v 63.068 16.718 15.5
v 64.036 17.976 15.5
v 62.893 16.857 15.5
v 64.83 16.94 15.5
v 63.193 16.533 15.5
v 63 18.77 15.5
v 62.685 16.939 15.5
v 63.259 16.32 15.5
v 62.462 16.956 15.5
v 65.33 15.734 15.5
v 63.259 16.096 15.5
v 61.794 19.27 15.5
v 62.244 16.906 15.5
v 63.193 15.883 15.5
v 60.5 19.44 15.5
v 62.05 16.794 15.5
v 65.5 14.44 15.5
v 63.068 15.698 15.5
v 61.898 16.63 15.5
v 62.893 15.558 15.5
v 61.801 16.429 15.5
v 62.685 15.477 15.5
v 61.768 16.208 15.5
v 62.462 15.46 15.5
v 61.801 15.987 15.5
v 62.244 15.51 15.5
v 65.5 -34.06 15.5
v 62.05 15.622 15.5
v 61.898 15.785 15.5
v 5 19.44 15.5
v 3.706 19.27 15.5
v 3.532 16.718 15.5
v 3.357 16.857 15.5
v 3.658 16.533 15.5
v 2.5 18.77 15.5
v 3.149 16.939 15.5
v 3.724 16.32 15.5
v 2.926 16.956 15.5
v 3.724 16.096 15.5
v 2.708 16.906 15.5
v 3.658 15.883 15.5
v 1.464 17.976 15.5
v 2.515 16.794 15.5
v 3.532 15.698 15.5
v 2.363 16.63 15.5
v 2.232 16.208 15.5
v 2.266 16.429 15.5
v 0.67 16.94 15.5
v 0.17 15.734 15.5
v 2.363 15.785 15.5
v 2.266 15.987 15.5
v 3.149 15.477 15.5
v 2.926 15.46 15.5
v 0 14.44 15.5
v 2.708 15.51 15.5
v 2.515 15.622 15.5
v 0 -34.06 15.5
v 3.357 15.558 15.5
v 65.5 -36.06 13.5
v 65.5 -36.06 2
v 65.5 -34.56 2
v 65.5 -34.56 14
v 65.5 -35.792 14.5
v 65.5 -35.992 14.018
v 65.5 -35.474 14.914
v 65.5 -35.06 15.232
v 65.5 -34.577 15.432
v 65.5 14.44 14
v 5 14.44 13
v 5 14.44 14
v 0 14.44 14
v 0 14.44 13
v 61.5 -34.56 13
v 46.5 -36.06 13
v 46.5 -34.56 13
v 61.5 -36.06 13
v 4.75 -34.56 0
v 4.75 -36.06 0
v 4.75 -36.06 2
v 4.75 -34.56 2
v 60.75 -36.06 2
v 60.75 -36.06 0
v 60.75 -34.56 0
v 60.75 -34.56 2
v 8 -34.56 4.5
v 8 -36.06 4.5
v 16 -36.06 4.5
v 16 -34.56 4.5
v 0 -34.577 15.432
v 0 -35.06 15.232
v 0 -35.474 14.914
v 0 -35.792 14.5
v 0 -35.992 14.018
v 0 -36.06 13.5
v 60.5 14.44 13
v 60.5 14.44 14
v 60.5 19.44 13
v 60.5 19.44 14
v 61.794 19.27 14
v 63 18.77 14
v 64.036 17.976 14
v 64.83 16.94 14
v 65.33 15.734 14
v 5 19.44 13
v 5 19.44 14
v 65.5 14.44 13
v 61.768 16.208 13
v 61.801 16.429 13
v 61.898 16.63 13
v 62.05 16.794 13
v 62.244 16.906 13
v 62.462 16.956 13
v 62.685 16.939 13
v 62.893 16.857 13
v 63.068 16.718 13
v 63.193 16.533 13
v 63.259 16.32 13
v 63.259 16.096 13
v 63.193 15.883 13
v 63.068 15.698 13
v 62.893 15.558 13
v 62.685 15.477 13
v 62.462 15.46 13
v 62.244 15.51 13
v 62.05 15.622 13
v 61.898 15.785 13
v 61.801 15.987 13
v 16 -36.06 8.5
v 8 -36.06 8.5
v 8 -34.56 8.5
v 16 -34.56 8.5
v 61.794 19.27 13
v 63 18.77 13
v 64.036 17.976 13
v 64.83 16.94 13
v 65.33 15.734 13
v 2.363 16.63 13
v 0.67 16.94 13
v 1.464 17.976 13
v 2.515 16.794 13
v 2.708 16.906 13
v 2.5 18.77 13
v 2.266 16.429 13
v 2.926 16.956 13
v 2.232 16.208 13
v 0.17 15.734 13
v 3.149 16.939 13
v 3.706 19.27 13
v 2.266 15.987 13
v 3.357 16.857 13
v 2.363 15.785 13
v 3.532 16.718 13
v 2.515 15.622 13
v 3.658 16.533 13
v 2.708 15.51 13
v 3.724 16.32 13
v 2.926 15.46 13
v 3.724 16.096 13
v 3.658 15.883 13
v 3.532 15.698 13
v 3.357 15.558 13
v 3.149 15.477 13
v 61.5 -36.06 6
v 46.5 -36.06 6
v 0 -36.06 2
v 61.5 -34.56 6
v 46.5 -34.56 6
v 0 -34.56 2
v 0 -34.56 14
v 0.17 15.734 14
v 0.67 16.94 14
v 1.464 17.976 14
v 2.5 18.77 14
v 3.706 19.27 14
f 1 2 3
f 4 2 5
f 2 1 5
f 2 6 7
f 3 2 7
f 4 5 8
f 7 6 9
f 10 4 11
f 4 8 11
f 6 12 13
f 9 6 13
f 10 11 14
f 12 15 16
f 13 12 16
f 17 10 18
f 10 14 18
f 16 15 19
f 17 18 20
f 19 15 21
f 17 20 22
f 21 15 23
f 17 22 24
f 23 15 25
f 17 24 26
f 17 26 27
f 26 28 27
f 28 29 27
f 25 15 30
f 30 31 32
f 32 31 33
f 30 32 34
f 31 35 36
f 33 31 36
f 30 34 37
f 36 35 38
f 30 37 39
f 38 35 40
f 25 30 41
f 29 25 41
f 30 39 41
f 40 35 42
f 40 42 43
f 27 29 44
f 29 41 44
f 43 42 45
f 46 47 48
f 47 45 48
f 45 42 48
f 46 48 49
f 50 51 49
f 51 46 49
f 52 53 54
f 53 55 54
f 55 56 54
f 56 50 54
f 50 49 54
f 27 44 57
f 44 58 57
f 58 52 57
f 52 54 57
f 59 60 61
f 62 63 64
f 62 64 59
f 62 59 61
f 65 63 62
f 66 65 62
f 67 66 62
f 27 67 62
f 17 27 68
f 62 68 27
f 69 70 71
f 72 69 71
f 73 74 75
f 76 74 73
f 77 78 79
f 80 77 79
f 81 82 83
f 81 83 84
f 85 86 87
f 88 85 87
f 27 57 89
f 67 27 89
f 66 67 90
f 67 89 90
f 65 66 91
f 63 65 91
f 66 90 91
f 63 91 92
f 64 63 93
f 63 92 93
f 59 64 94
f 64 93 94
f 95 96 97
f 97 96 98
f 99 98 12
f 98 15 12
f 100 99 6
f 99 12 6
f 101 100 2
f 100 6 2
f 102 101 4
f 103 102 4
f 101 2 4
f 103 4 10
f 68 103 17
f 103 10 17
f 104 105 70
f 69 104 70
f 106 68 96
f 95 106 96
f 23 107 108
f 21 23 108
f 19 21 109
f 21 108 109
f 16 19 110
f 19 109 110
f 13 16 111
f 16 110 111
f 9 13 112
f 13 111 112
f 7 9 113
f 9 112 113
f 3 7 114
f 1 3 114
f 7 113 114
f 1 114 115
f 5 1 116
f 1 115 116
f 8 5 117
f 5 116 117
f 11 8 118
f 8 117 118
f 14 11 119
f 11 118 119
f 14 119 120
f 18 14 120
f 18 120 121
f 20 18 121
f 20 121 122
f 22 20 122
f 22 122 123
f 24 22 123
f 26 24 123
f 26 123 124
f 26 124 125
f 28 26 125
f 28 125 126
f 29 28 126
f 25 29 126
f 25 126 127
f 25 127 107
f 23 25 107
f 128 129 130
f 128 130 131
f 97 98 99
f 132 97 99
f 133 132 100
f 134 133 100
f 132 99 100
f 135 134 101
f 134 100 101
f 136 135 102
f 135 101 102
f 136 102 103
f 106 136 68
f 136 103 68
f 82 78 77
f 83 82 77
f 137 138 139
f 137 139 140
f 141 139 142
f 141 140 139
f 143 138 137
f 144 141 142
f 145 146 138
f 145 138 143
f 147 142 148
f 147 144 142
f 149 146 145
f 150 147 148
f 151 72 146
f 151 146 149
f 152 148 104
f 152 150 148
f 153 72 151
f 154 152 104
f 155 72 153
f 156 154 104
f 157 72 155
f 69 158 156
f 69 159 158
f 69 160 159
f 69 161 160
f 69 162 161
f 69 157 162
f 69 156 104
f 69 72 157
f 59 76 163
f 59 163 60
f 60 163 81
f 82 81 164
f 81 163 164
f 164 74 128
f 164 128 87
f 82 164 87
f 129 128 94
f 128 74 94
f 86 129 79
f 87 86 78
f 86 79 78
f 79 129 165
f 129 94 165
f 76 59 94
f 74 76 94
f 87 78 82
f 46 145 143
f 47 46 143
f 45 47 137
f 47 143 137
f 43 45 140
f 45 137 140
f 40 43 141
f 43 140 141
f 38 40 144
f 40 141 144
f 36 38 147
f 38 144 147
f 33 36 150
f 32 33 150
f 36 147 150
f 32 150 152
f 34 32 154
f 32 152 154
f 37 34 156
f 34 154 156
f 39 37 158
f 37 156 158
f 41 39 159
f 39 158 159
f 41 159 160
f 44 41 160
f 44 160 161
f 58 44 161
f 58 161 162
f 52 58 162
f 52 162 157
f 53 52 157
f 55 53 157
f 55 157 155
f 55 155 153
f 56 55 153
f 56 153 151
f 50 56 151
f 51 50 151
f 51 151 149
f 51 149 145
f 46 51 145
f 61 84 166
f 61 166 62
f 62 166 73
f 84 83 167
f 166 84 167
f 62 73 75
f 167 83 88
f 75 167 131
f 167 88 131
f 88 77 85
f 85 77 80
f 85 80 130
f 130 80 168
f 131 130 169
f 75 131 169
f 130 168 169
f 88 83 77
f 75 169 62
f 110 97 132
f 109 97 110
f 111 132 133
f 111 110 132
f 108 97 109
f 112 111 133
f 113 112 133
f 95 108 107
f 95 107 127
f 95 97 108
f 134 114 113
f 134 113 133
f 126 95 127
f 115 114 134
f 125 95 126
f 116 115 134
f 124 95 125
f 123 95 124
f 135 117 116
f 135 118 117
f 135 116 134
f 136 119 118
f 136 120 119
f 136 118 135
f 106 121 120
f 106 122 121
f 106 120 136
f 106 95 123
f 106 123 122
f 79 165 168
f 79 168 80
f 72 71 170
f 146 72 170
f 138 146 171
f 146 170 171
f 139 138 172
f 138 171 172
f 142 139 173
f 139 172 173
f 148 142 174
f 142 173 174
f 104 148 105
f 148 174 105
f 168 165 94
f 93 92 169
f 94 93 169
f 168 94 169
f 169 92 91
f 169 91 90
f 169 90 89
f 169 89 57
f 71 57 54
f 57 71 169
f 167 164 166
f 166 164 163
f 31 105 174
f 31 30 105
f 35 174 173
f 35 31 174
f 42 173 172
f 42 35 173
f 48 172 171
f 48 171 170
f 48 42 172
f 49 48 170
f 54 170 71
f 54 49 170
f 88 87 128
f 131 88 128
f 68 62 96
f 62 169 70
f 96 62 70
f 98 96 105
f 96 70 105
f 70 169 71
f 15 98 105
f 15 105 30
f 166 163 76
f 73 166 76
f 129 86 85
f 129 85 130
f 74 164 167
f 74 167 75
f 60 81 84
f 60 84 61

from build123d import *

# Parameters (mm, degrees)
F1_DEPTH = 65.5
F2_R     = 5
F4_DEPTH = 1
F6_D     = 1.5
F6_DEPTH = 5
F7_W     = 15
F7_H     = 7
F7_W_2   = 8
F7_H_2   = 4
F8_DEPTH = 5
F7_W_3   = 4.75
F7_H_3   = 2
F9_DEPTH = 5


with BuildPart() as f1:
    # F0 (on Right) → F1 (new body)
    with BuildSketch(Plane.YZ):
        with BuildLine():
            Line((-36.059797, 0), (-34.559797, 0))
            Line((-34.559797, 0), (-34.559797, 14))
            Line((-34.559797, 14), (19.440203, 14))
            Line((19.440203, 14), (19.440203, 15.5))
            Line((19.440203, 15.5), (-34.059797, 15.5))
            ThreePointArc((-34.059797, 15.5), (-35.47401, 14.914214), (-36.059797, 13.5))
            Line((-36.059797, 13.5), (-36.059797, 0))
        make_face()
    extrude(amount=F1_DEPTH)

    # F2
    f2_edges = [f1.edges().sort_by_distance(p)[0] for p in [
        (65.5, 19.440203, 14.75),
        (0, 19.440203, 14.75),
    ]]
    fillet(f2_edges, radius=F2_R)

    # F3 (on face) → F4 (join)
    with BuildSketch(Plane(origin=(0, 0, 14), x_dir=(1, 0, 0), z_dir=(0, 0, -1))):
        with BuildLine():
            ThreePointArc((0, -14.440203), (1.464466, -17.975737), (5, -19.440203))
            Line((5, -19.440203), (5, -14.440203))
            Line((5, -14.440203), (0, -14.440203))
        make_face()
        with BuildLine():
            ThreePointArc((60.5, -19.440203), (64.035534, -17.975737), (65.5, -14.440203))
            Line((65.5, -14.440203), (60.5, -14.440203))
            Line((60.5, -14.440203), (60.5, -19.440203))
        make_face()
    extrude(amount=F4_DEPTH)

    # F6
    with Locations(Plane.XY.offset(15.5)):
        with Locations((2.982233, 16.20797), (62.517767, 16.20797)):
            Hole(F6_D / 2, depth=F6_DEPTH)

    # F7 (on face) → F8 (cut)
    with BuildSketch(Plane.XZ.offset(36.059797)):
        with Locations((54, 9.5)):
            Rectangle(F7_W, F7_H)
        with Locations((12, 6.5)):
            Rectangle(F7_W_2, F7_H_2)
    extrude(amount=-F8_DEPTH, mode=Mode.SUBTRACT)

    # F7 (on face) → F9 (cut)
    with BuildSketch(Plane.XZ.offset(36.059797)):
        with Locations((2.375, 1)):
            Rectangle(F7_W_3, F7_H_3)
        with Locations((63.125, 1)):
            Rectangle(F7_W_3, F7_H_3)
    extrude(amount=-F9_DEPTH, mode=Mode.SUBTRACT)


solid = f1.part
